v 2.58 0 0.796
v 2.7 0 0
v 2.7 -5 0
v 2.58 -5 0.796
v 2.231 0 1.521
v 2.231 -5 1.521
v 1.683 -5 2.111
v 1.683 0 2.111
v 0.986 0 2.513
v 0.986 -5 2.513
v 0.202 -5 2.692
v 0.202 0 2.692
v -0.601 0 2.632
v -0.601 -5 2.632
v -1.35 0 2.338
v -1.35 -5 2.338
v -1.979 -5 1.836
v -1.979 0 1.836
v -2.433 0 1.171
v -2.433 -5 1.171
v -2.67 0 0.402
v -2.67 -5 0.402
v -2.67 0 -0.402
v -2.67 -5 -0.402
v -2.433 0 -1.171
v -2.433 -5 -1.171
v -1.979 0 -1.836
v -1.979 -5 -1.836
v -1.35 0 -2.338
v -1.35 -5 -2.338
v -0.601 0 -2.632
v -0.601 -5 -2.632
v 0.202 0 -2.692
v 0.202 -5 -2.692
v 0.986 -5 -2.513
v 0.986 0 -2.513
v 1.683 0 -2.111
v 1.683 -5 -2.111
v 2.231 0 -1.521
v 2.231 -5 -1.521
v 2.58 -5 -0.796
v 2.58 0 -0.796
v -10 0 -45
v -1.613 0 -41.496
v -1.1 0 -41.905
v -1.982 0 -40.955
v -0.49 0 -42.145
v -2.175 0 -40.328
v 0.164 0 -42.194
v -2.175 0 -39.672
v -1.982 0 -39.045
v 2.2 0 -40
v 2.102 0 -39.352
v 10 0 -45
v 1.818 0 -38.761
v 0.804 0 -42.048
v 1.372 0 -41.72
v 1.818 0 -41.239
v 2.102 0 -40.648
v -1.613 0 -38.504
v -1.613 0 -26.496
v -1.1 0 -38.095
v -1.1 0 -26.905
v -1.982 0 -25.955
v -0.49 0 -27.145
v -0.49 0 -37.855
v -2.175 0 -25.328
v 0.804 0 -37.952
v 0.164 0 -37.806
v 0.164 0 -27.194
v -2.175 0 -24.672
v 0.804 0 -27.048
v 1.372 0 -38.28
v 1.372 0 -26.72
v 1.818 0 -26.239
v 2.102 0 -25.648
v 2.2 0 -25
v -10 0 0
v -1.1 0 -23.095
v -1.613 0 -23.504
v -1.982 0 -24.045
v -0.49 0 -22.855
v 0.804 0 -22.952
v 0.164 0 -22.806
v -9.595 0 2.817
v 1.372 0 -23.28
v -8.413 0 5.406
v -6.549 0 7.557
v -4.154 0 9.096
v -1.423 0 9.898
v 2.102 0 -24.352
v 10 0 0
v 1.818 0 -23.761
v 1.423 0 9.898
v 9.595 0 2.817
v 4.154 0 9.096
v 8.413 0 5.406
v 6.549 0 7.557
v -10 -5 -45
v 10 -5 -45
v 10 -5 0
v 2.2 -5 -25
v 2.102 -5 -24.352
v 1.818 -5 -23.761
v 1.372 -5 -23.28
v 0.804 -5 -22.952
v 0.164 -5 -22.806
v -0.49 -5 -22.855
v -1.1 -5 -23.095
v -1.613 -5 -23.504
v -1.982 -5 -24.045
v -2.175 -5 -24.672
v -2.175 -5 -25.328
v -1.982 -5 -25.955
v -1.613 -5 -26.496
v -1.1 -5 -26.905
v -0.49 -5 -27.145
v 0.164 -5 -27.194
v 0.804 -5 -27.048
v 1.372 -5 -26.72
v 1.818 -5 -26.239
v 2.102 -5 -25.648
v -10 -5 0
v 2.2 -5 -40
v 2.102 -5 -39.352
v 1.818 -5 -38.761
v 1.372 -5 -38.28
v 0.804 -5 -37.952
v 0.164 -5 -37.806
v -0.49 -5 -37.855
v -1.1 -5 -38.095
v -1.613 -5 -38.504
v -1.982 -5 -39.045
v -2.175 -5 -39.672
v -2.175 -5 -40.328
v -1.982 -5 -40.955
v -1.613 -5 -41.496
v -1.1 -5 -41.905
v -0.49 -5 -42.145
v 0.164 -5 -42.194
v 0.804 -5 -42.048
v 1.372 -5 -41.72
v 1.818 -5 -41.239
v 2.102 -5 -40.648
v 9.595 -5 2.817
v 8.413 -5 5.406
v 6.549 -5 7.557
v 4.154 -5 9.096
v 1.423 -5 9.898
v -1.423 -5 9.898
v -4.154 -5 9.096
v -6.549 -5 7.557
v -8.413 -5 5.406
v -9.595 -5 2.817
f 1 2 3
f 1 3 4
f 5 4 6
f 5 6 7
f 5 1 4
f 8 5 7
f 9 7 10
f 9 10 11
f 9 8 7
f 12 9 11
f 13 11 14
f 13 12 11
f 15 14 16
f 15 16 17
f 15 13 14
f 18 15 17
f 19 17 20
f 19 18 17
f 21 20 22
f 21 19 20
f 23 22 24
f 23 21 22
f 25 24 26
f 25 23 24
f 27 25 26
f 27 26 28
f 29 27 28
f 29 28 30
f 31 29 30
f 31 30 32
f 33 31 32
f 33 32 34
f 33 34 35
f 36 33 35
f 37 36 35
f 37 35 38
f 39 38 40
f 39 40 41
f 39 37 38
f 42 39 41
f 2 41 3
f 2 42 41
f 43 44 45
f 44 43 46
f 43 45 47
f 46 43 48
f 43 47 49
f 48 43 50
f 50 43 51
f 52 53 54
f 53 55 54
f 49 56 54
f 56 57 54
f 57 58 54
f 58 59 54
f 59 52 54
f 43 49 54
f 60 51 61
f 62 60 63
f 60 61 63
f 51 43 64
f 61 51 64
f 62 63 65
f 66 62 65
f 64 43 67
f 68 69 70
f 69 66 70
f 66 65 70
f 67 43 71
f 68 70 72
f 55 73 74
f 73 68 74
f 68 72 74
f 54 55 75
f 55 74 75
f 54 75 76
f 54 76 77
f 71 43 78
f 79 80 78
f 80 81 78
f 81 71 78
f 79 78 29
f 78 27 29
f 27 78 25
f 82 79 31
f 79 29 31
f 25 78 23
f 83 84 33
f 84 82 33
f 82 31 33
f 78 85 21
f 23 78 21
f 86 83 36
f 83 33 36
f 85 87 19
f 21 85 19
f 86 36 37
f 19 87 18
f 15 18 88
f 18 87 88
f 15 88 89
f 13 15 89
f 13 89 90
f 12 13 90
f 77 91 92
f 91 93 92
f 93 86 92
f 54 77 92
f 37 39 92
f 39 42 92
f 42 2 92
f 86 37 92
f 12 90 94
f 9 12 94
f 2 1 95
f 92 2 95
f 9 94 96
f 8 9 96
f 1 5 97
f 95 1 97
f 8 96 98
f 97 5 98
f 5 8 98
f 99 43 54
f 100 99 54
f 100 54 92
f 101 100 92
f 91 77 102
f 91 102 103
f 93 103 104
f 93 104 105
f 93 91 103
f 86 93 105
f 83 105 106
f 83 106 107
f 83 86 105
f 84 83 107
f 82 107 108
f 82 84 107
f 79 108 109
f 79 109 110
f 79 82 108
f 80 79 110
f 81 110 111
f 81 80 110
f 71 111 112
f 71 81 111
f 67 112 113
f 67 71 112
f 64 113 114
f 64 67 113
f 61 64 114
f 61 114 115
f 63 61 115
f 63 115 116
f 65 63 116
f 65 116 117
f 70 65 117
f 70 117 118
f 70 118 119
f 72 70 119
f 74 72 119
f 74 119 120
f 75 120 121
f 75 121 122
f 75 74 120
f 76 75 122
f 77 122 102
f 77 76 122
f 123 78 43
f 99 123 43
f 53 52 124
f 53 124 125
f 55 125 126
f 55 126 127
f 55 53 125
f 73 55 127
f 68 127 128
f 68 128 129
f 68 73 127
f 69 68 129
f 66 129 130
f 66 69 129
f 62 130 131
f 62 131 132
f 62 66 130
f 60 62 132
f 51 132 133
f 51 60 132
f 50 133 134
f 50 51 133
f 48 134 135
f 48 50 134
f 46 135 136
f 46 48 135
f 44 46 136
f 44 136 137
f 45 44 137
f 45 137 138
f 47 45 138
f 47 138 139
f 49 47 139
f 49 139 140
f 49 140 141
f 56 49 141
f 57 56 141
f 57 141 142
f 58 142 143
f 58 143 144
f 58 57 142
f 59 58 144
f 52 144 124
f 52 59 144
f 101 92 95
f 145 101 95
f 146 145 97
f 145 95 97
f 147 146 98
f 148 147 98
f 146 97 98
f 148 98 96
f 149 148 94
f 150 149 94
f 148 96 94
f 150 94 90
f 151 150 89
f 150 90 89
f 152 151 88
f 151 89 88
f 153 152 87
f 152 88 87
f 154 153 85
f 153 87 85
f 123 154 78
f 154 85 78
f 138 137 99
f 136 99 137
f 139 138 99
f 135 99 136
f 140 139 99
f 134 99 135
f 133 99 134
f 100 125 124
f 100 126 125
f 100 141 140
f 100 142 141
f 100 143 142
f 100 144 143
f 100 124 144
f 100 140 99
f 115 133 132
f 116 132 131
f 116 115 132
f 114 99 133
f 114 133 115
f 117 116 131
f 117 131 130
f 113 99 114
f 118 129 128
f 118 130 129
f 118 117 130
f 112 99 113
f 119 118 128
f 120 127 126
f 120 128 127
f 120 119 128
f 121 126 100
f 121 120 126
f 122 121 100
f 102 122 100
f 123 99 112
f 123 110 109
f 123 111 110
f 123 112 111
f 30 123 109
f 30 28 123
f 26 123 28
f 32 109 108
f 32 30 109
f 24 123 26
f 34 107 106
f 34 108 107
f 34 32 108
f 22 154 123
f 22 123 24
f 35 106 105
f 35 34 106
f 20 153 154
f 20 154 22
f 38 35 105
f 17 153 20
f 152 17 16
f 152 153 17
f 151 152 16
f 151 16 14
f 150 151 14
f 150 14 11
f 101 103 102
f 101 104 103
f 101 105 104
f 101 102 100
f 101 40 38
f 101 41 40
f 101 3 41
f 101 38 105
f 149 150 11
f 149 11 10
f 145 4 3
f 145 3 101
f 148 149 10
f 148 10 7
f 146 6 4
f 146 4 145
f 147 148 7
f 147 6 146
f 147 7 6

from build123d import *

# Parameters (mm, degrees)
F0_R     = 2.2
F0_R_2   = 2.7
F1_DEPTH = 5


with BuildPart() as f1:
    # F0 (on Front) → F1 (new body)
    with BuildSketch(Plane.XZ):
        with BuildLine():
            Line((-10, 0), (-10, -45))
            Line((-10, -45), (10, -45))
            Line((10, -45), (10, 0))
            ThreePointArc((10, 0), (0, 10), (-10, 0))
        make_face()
        with Locations((0, -40)):
            Circle(F0_R, mode=Mode.SUBTRACT)
        with Locations((0, -25)):
            Circle(F0_R, mode=Mode.SUBTRACT)
        Circle(F0_R_2, mode=Mode.SUBTRACT)
    extrude(amount=F1_DEPTH)


solid = f1.part
